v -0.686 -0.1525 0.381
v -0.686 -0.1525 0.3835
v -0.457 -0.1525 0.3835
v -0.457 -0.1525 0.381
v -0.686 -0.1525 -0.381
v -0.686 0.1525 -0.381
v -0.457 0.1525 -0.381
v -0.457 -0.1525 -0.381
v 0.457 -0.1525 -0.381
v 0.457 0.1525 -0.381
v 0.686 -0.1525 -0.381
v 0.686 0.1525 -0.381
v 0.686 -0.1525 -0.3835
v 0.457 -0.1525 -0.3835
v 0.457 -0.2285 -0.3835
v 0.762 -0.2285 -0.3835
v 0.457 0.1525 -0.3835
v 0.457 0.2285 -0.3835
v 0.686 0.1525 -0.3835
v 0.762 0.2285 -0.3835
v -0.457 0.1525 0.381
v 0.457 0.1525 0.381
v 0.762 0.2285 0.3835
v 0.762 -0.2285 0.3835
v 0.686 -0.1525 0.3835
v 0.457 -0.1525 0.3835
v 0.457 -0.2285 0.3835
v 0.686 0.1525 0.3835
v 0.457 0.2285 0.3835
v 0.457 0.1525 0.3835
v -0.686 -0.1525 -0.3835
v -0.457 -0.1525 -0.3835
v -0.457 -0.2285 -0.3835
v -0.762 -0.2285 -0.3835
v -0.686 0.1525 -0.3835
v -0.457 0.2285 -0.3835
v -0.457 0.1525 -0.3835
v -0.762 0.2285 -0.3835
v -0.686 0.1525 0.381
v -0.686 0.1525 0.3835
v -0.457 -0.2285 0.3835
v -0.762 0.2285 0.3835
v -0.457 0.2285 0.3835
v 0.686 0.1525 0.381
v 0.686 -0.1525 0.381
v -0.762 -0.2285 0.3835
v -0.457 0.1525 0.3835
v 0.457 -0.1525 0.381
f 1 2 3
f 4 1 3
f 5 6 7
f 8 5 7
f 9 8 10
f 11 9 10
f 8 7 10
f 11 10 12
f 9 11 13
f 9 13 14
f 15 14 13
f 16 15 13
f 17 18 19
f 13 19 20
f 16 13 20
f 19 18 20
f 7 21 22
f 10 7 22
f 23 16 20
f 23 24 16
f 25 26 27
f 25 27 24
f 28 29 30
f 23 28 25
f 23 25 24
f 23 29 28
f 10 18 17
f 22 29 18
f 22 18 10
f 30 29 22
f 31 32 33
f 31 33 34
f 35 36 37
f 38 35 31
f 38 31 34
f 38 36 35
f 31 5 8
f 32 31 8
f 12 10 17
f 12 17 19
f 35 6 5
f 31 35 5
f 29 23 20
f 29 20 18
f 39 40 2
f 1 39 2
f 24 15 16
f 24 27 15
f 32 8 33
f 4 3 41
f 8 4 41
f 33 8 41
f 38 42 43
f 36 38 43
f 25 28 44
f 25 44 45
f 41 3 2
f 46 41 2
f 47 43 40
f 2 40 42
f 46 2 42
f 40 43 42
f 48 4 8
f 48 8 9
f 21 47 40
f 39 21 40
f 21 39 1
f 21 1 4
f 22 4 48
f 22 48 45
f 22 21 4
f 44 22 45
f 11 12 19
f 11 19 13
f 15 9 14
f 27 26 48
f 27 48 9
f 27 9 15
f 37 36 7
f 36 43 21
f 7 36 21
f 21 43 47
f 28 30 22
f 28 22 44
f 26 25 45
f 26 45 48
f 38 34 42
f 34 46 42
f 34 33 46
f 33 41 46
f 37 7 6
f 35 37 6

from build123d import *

# Parameters (mm, degrees)
ESBO_O1_W                = 1.372
ESBO_O1_H                = 0.305
RESSALTO_EXTRUS_O1_DEPTH = 0.381
RESSALTO_EXTRUS_O2_DEPTH = 0.3835


with BuildPart() as part:
    # Esboço1 → Ressalto-extrusão1 (new body, symmetric)
    with BuildSketch(Plane.XY):
        Rectangle(ESBO_O1_W, ESBO_O1_H)
    extrude(amount=RESSALTO_EXTRUS_O1_DEPTH, both=True)

    # Esboço2 → Ressalto-extrusão2 (add, symmetric)
    with BuildSketch(Plane.XY):
        Polygon((-0.457, 0.1525), (-0.686, 0.1525), (-0.686, -0.1525), (-0.457, -0.1525), (-0.457, -0.2285), (-0.762, -0.2285), (-0.762, 0.2285), (-0.457, 0.2285), align=None)
    ressalto_extrus_o2 = extrude(amount=RESSALTO_EXTRUS_O2_DEPTH, both=True)

    # Espelhar1: Ressalto-extrusão2 across plane
    add(ressalto_extrus_o2.mirror(Plane(origin=(0, 0, 0), x_dir=(0, 0, 1), z_dir=(1, 0, 0))))


solid = part.part
